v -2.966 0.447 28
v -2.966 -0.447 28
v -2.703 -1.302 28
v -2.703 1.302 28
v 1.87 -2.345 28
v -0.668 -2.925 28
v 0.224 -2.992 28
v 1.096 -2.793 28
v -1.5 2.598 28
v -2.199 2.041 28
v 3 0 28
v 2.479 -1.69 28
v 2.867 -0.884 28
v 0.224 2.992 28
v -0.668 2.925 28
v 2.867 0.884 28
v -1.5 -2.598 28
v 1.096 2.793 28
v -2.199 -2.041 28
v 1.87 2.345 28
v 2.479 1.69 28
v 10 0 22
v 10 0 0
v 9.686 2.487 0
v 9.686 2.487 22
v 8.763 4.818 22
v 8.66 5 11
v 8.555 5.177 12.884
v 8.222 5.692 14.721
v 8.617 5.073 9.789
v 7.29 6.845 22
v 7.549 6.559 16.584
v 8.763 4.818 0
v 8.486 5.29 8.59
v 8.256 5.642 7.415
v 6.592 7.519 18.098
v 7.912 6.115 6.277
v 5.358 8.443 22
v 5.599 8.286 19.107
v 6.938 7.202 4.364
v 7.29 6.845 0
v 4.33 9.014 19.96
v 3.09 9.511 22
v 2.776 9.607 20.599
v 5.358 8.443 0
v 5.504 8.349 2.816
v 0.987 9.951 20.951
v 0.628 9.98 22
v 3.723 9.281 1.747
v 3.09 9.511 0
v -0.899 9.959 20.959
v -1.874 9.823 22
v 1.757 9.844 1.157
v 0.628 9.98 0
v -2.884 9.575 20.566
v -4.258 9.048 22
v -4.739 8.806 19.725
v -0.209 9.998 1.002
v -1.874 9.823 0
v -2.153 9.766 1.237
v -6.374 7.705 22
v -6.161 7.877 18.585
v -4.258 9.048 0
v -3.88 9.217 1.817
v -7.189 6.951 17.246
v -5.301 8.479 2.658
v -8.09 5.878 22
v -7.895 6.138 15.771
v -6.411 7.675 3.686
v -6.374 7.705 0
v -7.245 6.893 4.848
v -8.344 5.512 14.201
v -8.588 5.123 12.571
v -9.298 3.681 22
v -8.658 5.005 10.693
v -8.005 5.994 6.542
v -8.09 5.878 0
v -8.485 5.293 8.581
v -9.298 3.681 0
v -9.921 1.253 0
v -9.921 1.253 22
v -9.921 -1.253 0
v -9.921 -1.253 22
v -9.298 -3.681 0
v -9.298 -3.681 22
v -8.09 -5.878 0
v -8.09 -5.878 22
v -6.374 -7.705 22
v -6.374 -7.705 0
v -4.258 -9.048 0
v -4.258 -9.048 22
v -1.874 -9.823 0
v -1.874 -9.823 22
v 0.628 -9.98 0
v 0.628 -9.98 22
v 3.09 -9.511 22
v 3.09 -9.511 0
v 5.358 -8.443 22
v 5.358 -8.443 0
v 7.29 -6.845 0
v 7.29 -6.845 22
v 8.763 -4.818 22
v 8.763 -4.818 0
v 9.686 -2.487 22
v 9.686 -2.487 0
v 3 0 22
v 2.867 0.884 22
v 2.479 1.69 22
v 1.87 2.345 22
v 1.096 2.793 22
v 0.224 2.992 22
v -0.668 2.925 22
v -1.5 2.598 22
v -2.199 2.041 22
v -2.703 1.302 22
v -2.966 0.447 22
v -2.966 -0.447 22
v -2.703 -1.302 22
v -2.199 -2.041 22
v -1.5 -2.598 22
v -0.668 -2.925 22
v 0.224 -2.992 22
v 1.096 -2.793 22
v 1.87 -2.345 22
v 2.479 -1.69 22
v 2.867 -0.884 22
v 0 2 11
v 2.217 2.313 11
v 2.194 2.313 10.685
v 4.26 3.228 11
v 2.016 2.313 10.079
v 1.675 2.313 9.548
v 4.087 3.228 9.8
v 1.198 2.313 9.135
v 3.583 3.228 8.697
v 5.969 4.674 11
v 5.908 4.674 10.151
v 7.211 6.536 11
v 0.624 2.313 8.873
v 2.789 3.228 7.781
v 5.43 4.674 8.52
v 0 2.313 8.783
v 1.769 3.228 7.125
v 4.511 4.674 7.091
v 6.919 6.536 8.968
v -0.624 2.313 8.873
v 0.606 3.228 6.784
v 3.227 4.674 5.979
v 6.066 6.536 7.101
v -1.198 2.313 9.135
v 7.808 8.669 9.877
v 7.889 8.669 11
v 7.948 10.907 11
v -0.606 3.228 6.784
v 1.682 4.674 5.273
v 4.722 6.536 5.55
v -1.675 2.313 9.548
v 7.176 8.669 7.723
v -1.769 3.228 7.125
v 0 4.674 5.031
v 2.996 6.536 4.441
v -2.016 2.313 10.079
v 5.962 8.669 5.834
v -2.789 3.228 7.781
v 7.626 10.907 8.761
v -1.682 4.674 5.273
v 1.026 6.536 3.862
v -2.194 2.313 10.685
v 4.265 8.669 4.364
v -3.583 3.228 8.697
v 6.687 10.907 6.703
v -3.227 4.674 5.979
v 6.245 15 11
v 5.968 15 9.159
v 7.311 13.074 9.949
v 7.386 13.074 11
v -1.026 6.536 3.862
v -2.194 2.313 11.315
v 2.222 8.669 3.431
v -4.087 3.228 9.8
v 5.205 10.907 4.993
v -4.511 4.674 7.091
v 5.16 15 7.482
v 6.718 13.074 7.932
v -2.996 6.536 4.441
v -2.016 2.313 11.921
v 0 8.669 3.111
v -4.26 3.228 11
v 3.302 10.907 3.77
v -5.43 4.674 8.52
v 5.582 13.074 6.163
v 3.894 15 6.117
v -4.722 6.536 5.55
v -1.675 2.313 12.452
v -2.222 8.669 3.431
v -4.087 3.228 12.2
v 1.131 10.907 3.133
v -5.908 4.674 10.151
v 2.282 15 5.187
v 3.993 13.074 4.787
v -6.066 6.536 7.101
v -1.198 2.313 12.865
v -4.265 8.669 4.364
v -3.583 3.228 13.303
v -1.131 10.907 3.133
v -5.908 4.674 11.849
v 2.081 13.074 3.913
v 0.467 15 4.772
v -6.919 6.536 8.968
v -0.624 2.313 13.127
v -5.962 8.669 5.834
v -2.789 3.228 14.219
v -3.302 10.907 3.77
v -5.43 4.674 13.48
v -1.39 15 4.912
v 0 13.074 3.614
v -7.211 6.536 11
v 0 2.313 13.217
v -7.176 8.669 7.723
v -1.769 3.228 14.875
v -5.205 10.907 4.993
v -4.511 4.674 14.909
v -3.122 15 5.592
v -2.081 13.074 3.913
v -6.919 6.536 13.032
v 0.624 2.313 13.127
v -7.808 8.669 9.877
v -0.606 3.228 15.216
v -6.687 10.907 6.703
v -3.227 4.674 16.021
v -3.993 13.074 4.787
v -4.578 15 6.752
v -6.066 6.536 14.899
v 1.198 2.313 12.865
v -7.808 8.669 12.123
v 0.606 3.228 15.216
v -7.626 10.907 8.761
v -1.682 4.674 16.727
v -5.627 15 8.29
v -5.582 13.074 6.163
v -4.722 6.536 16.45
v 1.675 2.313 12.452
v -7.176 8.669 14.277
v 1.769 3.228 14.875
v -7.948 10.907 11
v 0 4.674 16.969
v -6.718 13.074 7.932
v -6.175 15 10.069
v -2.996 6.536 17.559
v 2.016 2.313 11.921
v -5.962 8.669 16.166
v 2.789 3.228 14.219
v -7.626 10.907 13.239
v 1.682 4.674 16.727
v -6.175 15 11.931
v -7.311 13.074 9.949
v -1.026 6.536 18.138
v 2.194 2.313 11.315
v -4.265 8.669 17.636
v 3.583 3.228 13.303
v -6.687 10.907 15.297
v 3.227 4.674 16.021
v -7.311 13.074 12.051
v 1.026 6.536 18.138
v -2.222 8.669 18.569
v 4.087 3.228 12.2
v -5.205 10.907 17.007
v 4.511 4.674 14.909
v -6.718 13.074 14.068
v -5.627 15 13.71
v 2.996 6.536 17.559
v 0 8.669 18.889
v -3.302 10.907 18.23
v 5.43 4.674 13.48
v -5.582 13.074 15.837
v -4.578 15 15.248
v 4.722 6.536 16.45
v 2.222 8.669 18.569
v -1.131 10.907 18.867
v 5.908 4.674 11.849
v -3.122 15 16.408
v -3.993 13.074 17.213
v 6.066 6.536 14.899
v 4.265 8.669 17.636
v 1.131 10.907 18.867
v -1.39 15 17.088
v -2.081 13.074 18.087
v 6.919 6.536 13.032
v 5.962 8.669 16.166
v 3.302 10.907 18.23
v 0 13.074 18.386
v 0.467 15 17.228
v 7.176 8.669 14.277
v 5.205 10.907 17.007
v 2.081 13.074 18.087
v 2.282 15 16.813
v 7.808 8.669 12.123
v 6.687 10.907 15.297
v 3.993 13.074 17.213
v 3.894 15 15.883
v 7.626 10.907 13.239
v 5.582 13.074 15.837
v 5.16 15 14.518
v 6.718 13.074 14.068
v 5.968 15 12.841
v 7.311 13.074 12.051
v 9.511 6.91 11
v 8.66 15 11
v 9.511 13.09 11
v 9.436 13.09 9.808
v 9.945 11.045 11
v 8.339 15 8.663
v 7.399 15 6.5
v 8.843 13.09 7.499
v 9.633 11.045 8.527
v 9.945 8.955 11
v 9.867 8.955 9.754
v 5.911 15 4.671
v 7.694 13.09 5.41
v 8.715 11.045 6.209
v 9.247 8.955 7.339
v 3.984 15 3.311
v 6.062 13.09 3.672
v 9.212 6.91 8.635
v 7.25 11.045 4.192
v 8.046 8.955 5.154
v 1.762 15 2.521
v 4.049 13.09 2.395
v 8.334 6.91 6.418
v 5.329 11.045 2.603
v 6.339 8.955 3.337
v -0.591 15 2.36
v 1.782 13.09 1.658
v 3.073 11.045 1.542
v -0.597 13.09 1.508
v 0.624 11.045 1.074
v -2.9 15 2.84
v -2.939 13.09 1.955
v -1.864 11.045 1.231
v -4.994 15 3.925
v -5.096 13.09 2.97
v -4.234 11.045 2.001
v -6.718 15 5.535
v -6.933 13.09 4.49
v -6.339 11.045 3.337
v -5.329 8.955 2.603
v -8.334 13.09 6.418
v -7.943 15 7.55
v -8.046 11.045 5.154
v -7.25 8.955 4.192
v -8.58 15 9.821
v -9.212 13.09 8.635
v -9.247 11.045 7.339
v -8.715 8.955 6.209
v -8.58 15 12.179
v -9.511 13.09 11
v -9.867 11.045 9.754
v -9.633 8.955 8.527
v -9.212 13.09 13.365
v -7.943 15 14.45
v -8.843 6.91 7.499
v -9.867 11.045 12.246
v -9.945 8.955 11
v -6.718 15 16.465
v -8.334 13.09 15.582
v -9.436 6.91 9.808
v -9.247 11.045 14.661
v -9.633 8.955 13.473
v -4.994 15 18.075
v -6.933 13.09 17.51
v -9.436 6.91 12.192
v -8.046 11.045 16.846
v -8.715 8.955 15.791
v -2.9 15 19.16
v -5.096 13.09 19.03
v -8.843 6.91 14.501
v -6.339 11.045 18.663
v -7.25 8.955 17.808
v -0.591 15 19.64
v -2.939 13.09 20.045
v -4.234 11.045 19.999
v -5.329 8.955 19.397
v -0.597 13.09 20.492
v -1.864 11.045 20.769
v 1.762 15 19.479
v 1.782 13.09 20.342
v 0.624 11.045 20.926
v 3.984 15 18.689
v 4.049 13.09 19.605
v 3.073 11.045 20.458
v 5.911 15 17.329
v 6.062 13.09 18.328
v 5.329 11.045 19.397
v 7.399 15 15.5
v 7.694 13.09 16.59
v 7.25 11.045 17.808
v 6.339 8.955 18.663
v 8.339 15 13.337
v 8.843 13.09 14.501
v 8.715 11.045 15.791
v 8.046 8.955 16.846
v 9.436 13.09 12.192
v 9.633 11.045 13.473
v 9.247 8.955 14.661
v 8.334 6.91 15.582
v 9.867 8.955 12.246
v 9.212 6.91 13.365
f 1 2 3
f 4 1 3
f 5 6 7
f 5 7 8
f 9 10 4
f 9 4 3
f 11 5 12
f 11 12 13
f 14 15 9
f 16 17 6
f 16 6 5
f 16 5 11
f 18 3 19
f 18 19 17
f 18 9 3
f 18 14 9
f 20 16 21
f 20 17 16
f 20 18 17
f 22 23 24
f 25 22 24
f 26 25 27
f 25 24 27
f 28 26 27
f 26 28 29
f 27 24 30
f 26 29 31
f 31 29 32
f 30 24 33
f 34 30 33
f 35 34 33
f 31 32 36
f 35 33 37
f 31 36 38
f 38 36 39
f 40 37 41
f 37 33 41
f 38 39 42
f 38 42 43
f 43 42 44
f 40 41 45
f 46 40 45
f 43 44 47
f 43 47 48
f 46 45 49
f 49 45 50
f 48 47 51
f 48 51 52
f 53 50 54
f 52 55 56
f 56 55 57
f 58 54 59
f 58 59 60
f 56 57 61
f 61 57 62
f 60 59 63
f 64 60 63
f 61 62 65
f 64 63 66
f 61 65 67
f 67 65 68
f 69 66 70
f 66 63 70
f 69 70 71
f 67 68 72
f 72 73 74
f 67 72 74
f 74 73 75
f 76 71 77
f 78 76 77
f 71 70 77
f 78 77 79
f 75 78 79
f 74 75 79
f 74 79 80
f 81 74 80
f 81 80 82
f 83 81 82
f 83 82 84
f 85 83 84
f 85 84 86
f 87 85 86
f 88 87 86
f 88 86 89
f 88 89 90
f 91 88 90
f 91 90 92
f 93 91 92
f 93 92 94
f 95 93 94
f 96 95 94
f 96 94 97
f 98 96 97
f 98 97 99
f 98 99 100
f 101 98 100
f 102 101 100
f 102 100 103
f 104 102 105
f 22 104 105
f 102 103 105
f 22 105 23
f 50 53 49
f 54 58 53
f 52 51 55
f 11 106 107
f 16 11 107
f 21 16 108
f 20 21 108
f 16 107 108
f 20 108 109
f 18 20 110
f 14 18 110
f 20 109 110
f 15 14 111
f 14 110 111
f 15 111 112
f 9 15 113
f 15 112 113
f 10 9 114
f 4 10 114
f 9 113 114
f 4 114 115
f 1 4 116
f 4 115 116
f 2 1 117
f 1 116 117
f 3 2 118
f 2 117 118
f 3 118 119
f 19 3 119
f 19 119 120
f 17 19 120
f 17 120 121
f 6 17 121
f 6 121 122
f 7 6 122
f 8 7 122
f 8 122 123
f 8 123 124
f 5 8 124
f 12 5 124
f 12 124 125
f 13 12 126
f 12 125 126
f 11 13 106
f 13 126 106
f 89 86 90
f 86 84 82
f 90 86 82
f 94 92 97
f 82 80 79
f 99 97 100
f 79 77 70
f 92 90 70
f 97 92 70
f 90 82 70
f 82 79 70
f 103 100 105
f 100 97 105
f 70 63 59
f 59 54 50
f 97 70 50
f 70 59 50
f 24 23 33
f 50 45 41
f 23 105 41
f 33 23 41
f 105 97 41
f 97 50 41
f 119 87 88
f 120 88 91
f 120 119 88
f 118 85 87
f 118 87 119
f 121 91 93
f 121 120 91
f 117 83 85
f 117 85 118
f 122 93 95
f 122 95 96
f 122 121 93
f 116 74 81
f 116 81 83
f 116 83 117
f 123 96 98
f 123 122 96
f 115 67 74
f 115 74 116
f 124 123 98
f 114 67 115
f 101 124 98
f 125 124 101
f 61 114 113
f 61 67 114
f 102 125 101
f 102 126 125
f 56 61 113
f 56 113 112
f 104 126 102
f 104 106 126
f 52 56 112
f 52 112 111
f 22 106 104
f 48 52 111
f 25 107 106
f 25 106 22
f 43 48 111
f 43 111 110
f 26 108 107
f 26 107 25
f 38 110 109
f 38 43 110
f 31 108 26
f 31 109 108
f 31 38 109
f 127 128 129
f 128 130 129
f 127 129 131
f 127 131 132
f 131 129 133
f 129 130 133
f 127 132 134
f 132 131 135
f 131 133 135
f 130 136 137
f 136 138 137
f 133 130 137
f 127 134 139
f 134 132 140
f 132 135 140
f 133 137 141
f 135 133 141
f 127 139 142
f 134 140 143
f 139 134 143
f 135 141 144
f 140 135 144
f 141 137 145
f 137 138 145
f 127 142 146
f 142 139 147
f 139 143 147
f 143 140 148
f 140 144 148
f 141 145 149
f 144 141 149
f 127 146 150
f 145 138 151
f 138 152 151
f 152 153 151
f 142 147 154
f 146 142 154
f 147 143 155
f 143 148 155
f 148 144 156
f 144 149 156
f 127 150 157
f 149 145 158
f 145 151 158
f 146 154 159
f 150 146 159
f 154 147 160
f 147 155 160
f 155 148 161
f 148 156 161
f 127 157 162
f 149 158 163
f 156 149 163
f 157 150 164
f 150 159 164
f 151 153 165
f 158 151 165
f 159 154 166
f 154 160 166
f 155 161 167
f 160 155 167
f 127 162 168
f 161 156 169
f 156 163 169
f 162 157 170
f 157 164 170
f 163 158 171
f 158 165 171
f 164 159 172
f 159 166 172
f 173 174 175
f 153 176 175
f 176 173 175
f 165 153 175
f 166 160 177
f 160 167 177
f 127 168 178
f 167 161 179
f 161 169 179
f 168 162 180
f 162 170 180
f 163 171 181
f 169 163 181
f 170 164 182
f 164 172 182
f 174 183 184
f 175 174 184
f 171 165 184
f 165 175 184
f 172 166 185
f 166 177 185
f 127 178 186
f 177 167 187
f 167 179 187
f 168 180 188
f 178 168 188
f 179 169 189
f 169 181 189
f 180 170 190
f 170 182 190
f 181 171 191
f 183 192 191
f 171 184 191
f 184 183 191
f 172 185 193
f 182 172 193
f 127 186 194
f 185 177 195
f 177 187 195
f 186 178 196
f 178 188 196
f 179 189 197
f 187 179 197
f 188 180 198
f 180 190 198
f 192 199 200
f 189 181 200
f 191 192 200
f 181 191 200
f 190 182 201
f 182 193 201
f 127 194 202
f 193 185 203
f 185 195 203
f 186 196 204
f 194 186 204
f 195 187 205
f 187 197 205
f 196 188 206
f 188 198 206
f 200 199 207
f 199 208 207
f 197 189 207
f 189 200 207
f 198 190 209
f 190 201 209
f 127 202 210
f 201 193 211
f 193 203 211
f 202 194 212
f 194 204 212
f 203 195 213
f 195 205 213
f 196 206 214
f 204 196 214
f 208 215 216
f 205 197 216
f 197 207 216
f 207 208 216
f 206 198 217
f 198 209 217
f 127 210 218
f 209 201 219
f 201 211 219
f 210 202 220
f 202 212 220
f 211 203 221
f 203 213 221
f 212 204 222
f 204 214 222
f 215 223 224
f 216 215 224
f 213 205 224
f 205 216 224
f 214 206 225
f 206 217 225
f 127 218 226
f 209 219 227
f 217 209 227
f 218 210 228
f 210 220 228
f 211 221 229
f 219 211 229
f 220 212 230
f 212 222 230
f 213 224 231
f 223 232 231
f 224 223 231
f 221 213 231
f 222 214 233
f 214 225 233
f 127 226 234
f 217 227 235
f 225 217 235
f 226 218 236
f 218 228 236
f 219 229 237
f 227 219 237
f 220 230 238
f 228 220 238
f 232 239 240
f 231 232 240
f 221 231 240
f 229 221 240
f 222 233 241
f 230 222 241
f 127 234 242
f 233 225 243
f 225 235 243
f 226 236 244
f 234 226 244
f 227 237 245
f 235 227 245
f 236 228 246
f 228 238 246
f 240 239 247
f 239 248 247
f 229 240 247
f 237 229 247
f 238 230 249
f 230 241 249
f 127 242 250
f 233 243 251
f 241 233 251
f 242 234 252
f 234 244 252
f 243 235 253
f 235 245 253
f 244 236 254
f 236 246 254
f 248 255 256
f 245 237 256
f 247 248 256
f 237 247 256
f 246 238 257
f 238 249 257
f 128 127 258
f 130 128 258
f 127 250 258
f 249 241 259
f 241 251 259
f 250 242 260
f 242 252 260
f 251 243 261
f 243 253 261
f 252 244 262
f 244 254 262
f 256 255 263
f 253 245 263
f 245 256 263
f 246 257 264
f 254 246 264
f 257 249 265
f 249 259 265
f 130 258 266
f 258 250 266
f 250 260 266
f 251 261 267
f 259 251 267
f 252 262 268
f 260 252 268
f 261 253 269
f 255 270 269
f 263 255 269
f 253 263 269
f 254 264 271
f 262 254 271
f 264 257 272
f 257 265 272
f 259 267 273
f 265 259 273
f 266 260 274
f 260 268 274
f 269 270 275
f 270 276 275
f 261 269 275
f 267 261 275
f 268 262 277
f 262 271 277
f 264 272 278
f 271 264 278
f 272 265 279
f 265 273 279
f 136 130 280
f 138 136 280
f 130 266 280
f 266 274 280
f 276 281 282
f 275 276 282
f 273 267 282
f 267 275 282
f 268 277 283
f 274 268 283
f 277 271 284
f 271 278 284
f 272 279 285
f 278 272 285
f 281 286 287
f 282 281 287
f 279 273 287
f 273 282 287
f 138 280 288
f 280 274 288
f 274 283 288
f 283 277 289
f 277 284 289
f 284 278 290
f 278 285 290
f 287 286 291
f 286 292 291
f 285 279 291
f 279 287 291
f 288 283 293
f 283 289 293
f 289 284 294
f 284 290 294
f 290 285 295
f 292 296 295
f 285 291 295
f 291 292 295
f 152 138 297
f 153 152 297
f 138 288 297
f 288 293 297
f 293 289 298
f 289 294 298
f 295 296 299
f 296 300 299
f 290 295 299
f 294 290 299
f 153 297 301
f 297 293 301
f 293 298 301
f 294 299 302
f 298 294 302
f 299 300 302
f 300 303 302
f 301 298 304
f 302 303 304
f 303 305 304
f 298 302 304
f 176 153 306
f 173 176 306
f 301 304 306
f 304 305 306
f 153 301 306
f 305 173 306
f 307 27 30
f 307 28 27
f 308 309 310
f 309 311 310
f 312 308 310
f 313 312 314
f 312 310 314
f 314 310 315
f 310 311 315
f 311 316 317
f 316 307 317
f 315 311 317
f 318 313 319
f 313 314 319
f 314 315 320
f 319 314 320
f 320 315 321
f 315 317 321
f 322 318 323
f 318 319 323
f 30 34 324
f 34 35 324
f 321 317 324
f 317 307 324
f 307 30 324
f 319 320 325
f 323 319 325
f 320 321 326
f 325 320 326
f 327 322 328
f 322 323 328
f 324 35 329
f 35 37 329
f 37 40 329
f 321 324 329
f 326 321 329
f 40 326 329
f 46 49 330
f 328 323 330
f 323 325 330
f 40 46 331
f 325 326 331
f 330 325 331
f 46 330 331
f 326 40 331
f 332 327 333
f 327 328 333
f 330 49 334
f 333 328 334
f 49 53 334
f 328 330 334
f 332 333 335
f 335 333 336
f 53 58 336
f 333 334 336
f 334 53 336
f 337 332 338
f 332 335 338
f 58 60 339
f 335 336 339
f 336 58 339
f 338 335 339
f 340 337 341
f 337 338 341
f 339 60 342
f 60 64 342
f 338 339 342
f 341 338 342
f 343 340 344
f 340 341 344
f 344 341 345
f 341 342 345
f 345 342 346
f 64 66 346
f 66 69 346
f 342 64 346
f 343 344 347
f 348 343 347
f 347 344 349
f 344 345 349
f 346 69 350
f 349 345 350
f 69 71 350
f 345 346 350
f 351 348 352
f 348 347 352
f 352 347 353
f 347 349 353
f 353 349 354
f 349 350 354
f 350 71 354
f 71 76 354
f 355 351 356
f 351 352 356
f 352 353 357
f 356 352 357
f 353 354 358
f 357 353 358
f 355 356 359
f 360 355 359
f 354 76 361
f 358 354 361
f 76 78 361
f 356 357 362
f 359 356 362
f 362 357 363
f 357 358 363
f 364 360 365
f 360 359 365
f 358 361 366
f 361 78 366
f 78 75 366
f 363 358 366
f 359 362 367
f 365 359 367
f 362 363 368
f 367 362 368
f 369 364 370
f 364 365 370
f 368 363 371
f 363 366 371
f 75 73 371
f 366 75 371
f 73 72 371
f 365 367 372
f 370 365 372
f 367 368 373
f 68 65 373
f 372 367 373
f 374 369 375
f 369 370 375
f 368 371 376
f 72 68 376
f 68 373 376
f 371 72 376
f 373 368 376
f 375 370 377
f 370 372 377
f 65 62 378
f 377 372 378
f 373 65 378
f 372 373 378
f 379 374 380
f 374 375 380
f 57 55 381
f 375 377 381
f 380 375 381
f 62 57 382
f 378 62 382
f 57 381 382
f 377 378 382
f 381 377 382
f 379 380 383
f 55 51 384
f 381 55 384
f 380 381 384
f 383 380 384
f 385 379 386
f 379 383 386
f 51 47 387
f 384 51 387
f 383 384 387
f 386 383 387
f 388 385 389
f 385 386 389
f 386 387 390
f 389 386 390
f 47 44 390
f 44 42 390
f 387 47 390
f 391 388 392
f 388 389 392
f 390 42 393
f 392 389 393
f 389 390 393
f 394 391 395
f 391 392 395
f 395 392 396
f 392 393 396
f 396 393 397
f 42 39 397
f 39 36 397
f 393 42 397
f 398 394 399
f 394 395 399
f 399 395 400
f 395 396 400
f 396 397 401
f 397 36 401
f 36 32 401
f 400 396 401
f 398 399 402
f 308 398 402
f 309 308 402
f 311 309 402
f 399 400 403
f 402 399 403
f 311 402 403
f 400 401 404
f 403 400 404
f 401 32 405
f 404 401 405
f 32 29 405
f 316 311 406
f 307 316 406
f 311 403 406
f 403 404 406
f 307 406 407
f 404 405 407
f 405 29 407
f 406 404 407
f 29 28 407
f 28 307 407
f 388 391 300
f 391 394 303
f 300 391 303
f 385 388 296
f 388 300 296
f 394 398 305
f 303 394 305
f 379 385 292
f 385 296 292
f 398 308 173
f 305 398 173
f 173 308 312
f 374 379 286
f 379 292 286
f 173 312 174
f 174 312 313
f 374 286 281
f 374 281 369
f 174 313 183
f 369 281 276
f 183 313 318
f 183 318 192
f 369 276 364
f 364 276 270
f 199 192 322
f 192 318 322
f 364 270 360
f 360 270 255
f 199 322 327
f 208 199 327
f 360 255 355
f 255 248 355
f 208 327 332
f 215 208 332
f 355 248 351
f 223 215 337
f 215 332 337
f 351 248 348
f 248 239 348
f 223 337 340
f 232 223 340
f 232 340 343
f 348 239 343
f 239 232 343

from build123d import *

# Parameters (mm, degrees)
SKETCH1_R           = 10
BOSS_EXTRUDE1_DEPTH = 22
SKETCH2_R           = 3
BOSS_EXTRUDE2_DEPTH = 6


with BuildPart() as part:
    # Sketch1 → Boss-Extrude1 (new body)
    with BuildSketch(Plane.XY):
        Circle(SKETCH1_R)
    extrude(amount=BOSS_EXTRUDE1_DEPTH)

    # Sketch2 → Boss-Extrude2 (add)
    with BuildSketch(Plane.XY.offset(22)):
        Circle(SKETCH2_R)
    extrude(amount=BOSS_EXTRUDE2_DEPTH)

    # Sketch6 → Cut-Revolve3 (revolve, cut)
    with BuildSketch(Plane(origin=(0, 0, 0), x_dir=(0, 0, -1), z_dir=(1, 0, 0)), mode=Mode.PRIVATE) as cut_revolve3_sk:
        with BuildLine():
            Line((-11, 0), (-11, 10))
            Line((-11, 10), (-1, 10))
            ThreePointArc((-1, 10), (-3.928932188, 2.928932188), (-11, 0))
        make_face()
    revolve(cut_revolve3_sk.sketch.rotate(Axis((0, 0, 11), (0, 1, 0)), 180), axis=Axis((0, 0, 11), (0, 1, 0)), mode=Mode.SUBTRACT)

    # Sketch7 → Revolve1 (revolve)
    with BuildSketch(Plane(origin=(0, 0, 0), x_dir=(0, 0, -1), z_dir=(1, 0, 0)), mode=Mode.PRIVATE) as revolve1_sk:
        with BuildLine():
            Line((-4.755002002, 15), (-2.339745962, 15))
            ThreePointArc((-2.339745962, 15), (-2.339745962, 5), (-11, 0))
            Line((-11, 0), (-11, 2))
            ThreePointArc((-11, 2), (-3.788897449, 6.535898385), (-4.755002002, 15))
        make_face()
    revolve(revolve1_sk.sketch.rotate(Axis((0, 0, 11), (0, 1, 0)), 270), axis=Axis((0, 0, 11), (0, 1, 0)))


solid = part.part
